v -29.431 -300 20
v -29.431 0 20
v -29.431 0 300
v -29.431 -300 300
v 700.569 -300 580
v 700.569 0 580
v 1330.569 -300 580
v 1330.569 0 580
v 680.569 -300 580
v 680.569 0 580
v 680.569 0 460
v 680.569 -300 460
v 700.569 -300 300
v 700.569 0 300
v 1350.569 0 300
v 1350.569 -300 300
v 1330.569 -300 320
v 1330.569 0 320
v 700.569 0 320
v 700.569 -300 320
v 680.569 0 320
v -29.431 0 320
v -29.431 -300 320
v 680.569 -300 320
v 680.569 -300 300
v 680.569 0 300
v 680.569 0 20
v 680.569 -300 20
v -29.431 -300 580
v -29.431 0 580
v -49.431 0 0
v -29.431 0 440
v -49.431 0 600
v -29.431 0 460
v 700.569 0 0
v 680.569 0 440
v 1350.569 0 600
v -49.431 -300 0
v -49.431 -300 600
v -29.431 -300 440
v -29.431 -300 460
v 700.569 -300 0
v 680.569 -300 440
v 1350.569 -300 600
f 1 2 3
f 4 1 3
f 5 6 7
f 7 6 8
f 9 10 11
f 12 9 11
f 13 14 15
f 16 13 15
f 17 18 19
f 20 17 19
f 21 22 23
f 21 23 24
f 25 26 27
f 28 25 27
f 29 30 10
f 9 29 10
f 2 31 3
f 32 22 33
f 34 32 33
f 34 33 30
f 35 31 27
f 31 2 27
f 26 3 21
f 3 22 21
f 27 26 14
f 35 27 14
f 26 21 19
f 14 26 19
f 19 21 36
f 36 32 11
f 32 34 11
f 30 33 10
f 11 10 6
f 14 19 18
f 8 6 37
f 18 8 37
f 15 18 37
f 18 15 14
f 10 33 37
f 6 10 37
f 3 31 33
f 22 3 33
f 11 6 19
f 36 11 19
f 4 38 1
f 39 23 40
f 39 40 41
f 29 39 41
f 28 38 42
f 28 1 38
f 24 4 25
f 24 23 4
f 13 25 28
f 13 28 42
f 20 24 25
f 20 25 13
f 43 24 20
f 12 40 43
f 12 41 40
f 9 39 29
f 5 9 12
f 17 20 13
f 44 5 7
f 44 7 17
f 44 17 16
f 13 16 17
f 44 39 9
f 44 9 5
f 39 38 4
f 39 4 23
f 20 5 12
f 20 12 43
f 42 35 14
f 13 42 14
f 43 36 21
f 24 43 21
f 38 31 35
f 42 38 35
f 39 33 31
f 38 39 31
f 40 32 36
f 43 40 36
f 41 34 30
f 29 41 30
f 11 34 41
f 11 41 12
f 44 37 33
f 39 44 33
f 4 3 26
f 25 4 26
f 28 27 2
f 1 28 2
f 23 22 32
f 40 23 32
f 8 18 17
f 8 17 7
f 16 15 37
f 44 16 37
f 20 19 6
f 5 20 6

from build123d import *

# Parameters (mm, degrees)
F0_W     = 20
F0_H     = 20
F0_W_2   = 710
F0_H_2   = 260
F1_DEPTH = 300


with BuildPart() as f1:
    # F0 (on Front) → F1 (new body)
    with BuildSketch(Plane.XZ):
        with Locations((-39.431209, 10)):
            Rectangle(F0_W, F0_H)
        with Locations((325.568791, 10)):
            Rectangle(F0_W_2, F0_H)
        Polygon((-49.431209, 580), (-49.431209, 20), (-29.431209, 20), (-29.431209, 300), (-29.431209, 320), (-29.431209, 440), (-29.431209, 460), (-29.431209, 580), align=None)
        with Locations((690.568791, 10)):
            Rectangle(F0_W, F0_H)
        with Locations((-39.431209, 590)):
            Rectangle(F0_W, F0_H)
        Polygon((680.568791, 300), (680.568791, 20), (700.568791, 20), (700.568791, 300), (1330.568791, 300), (1330.568791, 320), (700.568791, 320), (680.568791, 320), align=None)
        Polygon((-29.431209, 600), (-29.431209, 580), (680.568791, 580), (700.568791, 580), (1330.568791, 580), (1330.568791, 600), align=None)
        with Locations((1340.568791, 590)):
            Rectangle(F0_W, F0_H)
        with Locations((1340.568791, 310)):
            Rectangle(F0_W, F0_H)
        with Locations((1340.568791, 450)):
            Rectangle(F0_W, F0_H_2)
        with Locations((325.568791, 450)):
            Rectangle(F0_W_2, F0_H)
        Polygon((700.568791, 580), (680.568791, 580), (680.568791, 460), (680.568791, 440), (680.568791, 320), (700.568791, 320), align=None)
        with Locations((325.568791, 310)):
            Rectangle(F0_W_2, F0_H)
    extrude(amount=F1_DEPTH)


solid = f1.part
